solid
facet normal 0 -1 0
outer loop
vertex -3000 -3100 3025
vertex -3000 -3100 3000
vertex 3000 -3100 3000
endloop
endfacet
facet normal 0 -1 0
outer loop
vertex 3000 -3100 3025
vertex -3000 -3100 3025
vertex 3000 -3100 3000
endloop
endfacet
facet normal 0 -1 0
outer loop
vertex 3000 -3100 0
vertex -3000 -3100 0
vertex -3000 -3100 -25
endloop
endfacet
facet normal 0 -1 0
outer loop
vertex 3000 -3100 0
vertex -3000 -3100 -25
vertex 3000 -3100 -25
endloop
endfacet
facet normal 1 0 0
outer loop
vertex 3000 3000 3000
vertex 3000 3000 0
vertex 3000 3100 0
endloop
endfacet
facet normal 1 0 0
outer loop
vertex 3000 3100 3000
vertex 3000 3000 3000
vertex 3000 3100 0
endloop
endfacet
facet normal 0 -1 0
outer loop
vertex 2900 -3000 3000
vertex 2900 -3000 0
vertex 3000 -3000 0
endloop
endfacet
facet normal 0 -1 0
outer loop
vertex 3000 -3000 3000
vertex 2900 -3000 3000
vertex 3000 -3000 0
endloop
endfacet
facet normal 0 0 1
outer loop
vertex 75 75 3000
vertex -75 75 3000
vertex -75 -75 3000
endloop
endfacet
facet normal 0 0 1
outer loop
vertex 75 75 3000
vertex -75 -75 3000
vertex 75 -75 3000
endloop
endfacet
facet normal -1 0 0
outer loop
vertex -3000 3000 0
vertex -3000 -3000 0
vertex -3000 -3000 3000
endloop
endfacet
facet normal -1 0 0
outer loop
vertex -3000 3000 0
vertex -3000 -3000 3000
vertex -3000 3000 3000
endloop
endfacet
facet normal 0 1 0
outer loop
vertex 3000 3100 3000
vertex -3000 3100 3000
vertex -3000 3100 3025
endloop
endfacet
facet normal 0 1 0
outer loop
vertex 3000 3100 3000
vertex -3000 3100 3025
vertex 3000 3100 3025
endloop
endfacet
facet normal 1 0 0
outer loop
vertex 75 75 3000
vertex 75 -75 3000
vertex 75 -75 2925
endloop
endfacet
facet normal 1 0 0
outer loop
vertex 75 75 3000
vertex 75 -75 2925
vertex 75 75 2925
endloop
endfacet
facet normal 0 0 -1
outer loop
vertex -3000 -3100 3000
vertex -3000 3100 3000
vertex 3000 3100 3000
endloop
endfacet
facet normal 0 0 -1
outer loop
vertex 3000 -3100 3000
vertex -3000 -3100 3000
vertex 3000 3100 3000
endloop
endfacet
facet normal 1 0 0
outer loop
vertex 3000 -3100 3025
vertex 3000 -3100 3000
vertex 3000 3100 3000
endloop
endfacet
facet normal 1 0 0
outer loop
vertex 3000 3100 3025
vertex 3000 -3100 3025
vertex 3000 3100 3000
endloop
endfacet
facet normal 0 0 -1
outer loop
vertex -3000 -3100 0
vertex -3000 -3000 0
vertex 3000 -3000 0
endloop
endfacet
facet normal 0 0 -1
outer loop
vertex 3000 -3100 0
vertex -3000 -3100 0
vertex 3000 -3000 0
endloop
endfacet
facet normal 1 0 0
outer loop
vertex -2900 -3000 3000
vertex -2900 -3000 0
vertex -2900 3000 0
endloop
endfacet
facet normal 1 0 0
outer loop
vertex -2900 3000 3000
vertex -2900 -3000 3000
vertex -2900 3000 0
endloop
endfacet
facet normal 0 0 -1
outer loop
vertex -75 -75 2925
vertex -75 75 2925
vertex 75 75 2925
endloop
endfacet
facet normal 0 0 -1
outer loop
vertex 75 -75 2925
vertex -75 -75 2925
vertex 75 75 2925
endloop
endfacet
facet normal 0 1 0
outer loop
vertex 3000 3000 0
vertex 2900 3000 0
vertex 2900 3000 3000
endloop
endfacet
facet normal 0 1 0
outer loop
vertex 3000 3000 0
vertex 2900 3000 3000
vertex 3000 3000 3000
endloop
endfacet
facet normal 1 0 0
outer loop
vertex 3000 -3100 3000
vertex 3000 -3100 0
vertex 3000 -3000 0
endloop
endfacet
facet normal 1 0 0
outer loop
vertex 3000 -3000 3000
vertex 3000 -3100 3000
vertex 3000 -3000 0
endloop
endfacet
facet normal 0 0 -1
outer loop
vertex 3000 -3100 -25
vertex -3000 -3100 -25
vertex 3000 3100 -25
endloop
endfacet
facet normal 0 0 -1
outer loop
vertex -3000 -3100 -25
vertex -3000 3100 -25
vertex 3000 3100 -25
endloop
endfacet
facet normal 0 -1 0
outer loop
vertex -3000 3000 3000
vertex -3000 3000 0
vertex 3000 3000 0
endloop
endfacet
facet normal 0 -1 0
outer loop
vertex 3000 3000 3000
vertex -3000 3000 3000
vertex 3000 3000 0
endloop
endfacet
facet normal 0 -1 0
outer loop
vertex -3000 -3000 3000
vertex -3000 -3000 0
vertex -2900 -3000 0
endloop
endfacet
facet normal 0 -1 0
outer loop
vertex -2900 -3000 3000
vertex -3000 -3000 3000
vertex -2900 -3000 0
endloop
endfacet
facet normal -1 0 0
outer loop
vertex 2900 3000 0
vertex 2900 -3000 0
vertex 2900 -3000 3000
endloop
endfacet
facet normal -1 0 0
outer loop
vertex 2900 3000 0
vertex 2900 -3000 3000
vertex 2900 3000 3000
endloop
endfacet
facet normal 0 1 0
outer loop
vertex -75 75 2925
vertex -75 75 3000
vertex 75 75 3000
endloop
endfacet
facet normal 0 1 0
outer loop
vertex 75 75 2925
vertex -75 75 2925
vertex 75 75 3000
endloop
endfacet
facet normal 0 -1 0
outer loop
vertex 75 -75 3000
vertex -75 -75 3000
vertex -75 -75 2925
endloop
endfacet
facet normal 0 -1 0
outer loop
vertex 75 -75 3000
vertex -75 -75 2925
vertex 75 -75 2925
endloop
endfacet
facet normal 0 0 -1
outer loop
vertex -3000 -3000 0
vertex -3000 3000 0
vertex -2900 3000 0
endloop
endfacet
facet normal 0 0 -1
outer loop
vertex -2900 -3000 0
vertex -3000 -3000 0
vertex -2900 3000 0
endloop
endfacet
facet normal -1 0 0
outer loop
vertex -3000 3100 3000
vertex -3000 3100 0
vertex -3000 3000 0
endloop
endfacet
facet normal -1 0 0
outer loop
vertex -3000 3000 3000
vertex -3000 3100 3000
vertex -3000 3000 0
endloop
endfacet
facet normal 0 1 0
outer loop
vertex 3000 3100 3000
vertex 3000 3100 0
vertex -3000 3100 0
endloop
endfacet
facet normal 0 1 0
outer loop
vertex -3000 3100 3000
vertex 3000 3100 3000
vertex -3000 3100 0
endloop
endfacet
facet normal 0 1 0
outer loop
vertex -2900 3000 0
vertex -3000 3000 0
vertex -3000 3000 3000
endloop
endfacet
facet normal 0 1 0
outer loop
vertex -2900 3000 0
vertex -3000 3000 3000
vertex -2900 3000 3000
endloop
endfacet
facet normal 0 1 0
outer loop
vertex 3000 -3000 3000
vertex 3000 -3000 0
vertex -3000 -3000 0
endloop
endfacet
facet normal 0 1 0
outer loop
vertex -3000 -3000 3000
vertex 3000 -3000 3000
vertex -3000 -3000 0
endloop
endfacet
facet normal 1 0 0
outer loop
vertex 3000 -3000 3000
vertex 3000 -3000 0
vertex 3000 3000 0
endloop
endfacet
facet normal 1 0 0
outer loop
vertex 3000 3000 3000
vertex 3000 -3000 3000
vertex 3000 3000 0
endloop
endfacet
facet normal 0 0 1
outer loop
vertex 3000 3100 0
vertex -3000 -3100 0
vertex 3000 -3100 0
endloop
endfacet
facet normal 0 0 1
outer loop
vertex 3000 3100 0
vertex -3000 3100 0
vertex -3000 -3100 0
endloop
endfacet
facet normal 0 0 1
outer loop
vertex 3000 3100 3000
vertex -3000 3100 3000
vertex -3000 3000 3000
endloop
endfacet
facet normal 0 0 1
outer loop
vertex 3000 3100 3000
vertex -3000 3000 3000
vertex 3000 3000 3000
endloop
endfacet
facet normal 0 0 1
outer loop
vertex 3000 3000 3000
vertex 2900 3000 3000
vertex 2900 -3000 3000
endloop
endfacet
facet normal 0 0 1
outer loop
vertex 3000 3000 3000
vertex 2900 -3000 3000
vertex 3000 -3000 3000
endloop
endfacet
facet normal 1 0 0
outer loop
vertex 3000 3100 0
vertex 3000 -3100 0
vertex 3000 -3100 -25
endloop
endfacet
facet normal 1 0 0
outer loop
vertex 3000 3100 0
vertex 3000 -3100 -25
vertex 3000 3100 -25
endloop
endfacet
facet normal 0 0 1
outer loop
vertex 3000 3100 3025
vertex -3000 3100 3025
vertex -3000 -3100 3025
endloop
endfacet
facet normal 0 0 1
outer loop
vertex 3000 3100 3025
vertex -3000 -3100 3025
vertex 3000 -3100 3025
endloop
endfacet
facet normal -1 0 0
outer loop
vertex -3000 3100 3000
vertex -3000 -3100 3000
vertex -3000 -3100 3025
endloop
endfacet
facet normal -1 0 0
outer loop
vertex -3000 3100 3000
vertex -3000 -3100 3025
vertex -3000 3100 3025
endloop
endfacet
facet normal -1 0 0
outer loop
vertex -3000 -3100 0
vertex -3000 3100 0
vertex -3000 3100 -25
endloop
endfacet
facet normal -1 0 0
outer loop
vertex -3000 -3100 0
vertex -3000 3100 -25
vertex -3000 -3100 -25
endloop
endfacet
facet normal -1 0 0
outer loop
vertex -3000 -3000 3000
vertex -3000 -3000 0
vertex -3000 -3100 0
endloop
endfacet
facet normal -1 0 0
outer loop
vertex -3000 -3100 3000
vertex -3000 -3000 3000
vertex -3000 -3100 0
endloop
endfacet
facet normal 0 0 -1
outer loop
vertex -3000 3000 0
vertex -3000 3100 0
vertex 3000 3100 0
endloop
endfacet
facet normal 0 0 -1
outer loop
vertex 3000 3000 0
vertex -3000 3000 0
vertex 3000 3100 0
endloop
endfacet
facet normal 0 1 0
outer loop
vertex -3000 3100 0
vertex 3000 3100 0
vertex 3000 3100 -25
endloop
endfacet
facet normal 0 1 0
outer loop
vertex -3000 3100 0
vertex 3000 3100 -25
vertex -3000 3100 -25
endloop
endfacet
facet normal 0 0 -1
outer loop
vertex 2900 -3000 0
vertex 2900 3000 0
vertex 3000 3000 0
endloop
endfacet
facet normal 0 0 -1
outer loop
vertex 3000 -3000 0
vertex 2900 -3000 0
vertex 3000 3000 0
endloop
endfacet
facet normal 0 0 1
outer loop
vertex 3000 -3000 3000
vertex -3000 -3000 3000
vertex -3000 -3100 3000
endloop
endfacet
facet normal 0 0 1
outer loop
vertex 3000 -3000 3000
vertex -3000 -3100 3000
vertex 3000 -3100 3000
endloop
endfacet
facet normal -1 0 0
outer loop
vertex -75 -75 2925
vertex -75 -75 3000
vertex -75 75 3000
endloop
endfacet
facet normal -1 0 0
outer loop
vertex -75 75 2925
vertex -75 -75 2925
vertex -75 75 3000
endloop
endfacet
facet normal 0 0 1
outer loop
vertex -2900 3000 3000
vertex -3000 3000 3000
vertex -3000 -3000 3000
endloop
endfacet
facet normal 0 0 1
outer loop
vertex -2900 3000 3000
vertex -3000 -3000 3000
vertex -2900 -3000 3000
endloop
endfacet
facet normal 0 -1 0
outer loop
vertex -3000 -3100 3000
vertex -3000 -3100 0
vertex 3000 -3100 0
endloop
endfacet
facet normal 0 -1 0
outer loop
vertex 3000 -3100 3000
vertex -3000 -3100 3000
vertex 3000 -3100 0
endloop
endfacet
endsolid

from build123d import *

# Parameters (mm, degrees)
F1_DEPTH = 3000
F0_W     = 100
F0_H     = 6000
F2_DEPTH = 3000
F3_DEPTH = 3000
F4_DEPTH = 3000
F0_W_2   = 5800
F5_DEPTH = 25
F6_W     = 6000
F6_H     = 6200
F6_W_2   = 150
F6_H_2   = 150
F7_DEPTH = 25
F8_DEPTH = 75


with BuildPart() as f1:
    # F0 (on Top) → F1 (new body)
    with BuildSketch(Plane.XY):
        Polygon((-3000, 3100), (-3000, 3000), (-2900, 3000), (2900, 3000), (3000, 3000), (3000, 3100), align=None)
    extrude(amount=F1_DEPTH)


with BuildPart() as f2:
    # F0 (on Top) → F2 (new body, through all)
    with BuildSketch(Plane.XY):
        with Locations((-2950, 0)):
            Rectangle(F0_W, F0_H)
    extrude(amount=F2_DEPTH)


with BuildPart() as f3:
    # F0 (on Top) → F3 (new body, through all)
    with BuildSketch(Plane.XY):
        Polygon((-2900, -3000), (-3000, -3000), (-3000, -3100), (3000, -3100), (3000, -3000), (2900, -3000), align=None)
    extrude(amount=F3_DEPTH)


with BuildPart() as f4:
    # F0 (on Top) → F4 (new body, through all)
    with BuildSketch(Plane.XY):
        with Locations((2950, 0)):
            Rectangle(F0_W, F0_H)
    extrude(amount=F4_DEPTH)


with BuildPart() as f5:
    # F0 (on Top) → F5 (new body)
    with BuildSketch(Plane.XY):
        Polygon((-2900, -3000), (-3000, -3000), (-3000, -3100), (3000, -3100), (3000, -3000), (2900, -3000), align=None)
        with Locations((-2950, 0)):
            Rectangle(F0_W, F0_H)
        Rectangle(F0_W_2, F0_H)
        Polygon((-3000, 3100), (-3000, 3000), (-2900, 3000), (2900, 3000), (3000, 3000), (3000, 3100), align=None)
        with Locations((2950, 0)):
            Rectangle(F0_W, F0_H)
    extrude(amount=-F5_DEPTH)


with BuildPart() as f7:
    # F6 (on face) → F7 (new body)
    with BuildSketch(Plane.XY.offset(3000)):
        Rectangle(F6_W, F6_H)
        Rectangle(F6_W_2, F6_H_2, mode=Mode.SUBTRACT)
        Rectangle(F6_W_2, F6_H_2)
    extrude(amount=F7_DEPTH)


with BuildPart() as f8:
    # F6 (on face) → F8 (new body)
    with BuildSketch(Plane.XY.offset(3000)):
        Rectangle(F6_W_2, F6_H_2)
    extrude(amount=-F8_DEPTH)


solid = Compound([f1.part, f2.part, f3.part, f4.part, f5.part, f7.part, f8.part])
